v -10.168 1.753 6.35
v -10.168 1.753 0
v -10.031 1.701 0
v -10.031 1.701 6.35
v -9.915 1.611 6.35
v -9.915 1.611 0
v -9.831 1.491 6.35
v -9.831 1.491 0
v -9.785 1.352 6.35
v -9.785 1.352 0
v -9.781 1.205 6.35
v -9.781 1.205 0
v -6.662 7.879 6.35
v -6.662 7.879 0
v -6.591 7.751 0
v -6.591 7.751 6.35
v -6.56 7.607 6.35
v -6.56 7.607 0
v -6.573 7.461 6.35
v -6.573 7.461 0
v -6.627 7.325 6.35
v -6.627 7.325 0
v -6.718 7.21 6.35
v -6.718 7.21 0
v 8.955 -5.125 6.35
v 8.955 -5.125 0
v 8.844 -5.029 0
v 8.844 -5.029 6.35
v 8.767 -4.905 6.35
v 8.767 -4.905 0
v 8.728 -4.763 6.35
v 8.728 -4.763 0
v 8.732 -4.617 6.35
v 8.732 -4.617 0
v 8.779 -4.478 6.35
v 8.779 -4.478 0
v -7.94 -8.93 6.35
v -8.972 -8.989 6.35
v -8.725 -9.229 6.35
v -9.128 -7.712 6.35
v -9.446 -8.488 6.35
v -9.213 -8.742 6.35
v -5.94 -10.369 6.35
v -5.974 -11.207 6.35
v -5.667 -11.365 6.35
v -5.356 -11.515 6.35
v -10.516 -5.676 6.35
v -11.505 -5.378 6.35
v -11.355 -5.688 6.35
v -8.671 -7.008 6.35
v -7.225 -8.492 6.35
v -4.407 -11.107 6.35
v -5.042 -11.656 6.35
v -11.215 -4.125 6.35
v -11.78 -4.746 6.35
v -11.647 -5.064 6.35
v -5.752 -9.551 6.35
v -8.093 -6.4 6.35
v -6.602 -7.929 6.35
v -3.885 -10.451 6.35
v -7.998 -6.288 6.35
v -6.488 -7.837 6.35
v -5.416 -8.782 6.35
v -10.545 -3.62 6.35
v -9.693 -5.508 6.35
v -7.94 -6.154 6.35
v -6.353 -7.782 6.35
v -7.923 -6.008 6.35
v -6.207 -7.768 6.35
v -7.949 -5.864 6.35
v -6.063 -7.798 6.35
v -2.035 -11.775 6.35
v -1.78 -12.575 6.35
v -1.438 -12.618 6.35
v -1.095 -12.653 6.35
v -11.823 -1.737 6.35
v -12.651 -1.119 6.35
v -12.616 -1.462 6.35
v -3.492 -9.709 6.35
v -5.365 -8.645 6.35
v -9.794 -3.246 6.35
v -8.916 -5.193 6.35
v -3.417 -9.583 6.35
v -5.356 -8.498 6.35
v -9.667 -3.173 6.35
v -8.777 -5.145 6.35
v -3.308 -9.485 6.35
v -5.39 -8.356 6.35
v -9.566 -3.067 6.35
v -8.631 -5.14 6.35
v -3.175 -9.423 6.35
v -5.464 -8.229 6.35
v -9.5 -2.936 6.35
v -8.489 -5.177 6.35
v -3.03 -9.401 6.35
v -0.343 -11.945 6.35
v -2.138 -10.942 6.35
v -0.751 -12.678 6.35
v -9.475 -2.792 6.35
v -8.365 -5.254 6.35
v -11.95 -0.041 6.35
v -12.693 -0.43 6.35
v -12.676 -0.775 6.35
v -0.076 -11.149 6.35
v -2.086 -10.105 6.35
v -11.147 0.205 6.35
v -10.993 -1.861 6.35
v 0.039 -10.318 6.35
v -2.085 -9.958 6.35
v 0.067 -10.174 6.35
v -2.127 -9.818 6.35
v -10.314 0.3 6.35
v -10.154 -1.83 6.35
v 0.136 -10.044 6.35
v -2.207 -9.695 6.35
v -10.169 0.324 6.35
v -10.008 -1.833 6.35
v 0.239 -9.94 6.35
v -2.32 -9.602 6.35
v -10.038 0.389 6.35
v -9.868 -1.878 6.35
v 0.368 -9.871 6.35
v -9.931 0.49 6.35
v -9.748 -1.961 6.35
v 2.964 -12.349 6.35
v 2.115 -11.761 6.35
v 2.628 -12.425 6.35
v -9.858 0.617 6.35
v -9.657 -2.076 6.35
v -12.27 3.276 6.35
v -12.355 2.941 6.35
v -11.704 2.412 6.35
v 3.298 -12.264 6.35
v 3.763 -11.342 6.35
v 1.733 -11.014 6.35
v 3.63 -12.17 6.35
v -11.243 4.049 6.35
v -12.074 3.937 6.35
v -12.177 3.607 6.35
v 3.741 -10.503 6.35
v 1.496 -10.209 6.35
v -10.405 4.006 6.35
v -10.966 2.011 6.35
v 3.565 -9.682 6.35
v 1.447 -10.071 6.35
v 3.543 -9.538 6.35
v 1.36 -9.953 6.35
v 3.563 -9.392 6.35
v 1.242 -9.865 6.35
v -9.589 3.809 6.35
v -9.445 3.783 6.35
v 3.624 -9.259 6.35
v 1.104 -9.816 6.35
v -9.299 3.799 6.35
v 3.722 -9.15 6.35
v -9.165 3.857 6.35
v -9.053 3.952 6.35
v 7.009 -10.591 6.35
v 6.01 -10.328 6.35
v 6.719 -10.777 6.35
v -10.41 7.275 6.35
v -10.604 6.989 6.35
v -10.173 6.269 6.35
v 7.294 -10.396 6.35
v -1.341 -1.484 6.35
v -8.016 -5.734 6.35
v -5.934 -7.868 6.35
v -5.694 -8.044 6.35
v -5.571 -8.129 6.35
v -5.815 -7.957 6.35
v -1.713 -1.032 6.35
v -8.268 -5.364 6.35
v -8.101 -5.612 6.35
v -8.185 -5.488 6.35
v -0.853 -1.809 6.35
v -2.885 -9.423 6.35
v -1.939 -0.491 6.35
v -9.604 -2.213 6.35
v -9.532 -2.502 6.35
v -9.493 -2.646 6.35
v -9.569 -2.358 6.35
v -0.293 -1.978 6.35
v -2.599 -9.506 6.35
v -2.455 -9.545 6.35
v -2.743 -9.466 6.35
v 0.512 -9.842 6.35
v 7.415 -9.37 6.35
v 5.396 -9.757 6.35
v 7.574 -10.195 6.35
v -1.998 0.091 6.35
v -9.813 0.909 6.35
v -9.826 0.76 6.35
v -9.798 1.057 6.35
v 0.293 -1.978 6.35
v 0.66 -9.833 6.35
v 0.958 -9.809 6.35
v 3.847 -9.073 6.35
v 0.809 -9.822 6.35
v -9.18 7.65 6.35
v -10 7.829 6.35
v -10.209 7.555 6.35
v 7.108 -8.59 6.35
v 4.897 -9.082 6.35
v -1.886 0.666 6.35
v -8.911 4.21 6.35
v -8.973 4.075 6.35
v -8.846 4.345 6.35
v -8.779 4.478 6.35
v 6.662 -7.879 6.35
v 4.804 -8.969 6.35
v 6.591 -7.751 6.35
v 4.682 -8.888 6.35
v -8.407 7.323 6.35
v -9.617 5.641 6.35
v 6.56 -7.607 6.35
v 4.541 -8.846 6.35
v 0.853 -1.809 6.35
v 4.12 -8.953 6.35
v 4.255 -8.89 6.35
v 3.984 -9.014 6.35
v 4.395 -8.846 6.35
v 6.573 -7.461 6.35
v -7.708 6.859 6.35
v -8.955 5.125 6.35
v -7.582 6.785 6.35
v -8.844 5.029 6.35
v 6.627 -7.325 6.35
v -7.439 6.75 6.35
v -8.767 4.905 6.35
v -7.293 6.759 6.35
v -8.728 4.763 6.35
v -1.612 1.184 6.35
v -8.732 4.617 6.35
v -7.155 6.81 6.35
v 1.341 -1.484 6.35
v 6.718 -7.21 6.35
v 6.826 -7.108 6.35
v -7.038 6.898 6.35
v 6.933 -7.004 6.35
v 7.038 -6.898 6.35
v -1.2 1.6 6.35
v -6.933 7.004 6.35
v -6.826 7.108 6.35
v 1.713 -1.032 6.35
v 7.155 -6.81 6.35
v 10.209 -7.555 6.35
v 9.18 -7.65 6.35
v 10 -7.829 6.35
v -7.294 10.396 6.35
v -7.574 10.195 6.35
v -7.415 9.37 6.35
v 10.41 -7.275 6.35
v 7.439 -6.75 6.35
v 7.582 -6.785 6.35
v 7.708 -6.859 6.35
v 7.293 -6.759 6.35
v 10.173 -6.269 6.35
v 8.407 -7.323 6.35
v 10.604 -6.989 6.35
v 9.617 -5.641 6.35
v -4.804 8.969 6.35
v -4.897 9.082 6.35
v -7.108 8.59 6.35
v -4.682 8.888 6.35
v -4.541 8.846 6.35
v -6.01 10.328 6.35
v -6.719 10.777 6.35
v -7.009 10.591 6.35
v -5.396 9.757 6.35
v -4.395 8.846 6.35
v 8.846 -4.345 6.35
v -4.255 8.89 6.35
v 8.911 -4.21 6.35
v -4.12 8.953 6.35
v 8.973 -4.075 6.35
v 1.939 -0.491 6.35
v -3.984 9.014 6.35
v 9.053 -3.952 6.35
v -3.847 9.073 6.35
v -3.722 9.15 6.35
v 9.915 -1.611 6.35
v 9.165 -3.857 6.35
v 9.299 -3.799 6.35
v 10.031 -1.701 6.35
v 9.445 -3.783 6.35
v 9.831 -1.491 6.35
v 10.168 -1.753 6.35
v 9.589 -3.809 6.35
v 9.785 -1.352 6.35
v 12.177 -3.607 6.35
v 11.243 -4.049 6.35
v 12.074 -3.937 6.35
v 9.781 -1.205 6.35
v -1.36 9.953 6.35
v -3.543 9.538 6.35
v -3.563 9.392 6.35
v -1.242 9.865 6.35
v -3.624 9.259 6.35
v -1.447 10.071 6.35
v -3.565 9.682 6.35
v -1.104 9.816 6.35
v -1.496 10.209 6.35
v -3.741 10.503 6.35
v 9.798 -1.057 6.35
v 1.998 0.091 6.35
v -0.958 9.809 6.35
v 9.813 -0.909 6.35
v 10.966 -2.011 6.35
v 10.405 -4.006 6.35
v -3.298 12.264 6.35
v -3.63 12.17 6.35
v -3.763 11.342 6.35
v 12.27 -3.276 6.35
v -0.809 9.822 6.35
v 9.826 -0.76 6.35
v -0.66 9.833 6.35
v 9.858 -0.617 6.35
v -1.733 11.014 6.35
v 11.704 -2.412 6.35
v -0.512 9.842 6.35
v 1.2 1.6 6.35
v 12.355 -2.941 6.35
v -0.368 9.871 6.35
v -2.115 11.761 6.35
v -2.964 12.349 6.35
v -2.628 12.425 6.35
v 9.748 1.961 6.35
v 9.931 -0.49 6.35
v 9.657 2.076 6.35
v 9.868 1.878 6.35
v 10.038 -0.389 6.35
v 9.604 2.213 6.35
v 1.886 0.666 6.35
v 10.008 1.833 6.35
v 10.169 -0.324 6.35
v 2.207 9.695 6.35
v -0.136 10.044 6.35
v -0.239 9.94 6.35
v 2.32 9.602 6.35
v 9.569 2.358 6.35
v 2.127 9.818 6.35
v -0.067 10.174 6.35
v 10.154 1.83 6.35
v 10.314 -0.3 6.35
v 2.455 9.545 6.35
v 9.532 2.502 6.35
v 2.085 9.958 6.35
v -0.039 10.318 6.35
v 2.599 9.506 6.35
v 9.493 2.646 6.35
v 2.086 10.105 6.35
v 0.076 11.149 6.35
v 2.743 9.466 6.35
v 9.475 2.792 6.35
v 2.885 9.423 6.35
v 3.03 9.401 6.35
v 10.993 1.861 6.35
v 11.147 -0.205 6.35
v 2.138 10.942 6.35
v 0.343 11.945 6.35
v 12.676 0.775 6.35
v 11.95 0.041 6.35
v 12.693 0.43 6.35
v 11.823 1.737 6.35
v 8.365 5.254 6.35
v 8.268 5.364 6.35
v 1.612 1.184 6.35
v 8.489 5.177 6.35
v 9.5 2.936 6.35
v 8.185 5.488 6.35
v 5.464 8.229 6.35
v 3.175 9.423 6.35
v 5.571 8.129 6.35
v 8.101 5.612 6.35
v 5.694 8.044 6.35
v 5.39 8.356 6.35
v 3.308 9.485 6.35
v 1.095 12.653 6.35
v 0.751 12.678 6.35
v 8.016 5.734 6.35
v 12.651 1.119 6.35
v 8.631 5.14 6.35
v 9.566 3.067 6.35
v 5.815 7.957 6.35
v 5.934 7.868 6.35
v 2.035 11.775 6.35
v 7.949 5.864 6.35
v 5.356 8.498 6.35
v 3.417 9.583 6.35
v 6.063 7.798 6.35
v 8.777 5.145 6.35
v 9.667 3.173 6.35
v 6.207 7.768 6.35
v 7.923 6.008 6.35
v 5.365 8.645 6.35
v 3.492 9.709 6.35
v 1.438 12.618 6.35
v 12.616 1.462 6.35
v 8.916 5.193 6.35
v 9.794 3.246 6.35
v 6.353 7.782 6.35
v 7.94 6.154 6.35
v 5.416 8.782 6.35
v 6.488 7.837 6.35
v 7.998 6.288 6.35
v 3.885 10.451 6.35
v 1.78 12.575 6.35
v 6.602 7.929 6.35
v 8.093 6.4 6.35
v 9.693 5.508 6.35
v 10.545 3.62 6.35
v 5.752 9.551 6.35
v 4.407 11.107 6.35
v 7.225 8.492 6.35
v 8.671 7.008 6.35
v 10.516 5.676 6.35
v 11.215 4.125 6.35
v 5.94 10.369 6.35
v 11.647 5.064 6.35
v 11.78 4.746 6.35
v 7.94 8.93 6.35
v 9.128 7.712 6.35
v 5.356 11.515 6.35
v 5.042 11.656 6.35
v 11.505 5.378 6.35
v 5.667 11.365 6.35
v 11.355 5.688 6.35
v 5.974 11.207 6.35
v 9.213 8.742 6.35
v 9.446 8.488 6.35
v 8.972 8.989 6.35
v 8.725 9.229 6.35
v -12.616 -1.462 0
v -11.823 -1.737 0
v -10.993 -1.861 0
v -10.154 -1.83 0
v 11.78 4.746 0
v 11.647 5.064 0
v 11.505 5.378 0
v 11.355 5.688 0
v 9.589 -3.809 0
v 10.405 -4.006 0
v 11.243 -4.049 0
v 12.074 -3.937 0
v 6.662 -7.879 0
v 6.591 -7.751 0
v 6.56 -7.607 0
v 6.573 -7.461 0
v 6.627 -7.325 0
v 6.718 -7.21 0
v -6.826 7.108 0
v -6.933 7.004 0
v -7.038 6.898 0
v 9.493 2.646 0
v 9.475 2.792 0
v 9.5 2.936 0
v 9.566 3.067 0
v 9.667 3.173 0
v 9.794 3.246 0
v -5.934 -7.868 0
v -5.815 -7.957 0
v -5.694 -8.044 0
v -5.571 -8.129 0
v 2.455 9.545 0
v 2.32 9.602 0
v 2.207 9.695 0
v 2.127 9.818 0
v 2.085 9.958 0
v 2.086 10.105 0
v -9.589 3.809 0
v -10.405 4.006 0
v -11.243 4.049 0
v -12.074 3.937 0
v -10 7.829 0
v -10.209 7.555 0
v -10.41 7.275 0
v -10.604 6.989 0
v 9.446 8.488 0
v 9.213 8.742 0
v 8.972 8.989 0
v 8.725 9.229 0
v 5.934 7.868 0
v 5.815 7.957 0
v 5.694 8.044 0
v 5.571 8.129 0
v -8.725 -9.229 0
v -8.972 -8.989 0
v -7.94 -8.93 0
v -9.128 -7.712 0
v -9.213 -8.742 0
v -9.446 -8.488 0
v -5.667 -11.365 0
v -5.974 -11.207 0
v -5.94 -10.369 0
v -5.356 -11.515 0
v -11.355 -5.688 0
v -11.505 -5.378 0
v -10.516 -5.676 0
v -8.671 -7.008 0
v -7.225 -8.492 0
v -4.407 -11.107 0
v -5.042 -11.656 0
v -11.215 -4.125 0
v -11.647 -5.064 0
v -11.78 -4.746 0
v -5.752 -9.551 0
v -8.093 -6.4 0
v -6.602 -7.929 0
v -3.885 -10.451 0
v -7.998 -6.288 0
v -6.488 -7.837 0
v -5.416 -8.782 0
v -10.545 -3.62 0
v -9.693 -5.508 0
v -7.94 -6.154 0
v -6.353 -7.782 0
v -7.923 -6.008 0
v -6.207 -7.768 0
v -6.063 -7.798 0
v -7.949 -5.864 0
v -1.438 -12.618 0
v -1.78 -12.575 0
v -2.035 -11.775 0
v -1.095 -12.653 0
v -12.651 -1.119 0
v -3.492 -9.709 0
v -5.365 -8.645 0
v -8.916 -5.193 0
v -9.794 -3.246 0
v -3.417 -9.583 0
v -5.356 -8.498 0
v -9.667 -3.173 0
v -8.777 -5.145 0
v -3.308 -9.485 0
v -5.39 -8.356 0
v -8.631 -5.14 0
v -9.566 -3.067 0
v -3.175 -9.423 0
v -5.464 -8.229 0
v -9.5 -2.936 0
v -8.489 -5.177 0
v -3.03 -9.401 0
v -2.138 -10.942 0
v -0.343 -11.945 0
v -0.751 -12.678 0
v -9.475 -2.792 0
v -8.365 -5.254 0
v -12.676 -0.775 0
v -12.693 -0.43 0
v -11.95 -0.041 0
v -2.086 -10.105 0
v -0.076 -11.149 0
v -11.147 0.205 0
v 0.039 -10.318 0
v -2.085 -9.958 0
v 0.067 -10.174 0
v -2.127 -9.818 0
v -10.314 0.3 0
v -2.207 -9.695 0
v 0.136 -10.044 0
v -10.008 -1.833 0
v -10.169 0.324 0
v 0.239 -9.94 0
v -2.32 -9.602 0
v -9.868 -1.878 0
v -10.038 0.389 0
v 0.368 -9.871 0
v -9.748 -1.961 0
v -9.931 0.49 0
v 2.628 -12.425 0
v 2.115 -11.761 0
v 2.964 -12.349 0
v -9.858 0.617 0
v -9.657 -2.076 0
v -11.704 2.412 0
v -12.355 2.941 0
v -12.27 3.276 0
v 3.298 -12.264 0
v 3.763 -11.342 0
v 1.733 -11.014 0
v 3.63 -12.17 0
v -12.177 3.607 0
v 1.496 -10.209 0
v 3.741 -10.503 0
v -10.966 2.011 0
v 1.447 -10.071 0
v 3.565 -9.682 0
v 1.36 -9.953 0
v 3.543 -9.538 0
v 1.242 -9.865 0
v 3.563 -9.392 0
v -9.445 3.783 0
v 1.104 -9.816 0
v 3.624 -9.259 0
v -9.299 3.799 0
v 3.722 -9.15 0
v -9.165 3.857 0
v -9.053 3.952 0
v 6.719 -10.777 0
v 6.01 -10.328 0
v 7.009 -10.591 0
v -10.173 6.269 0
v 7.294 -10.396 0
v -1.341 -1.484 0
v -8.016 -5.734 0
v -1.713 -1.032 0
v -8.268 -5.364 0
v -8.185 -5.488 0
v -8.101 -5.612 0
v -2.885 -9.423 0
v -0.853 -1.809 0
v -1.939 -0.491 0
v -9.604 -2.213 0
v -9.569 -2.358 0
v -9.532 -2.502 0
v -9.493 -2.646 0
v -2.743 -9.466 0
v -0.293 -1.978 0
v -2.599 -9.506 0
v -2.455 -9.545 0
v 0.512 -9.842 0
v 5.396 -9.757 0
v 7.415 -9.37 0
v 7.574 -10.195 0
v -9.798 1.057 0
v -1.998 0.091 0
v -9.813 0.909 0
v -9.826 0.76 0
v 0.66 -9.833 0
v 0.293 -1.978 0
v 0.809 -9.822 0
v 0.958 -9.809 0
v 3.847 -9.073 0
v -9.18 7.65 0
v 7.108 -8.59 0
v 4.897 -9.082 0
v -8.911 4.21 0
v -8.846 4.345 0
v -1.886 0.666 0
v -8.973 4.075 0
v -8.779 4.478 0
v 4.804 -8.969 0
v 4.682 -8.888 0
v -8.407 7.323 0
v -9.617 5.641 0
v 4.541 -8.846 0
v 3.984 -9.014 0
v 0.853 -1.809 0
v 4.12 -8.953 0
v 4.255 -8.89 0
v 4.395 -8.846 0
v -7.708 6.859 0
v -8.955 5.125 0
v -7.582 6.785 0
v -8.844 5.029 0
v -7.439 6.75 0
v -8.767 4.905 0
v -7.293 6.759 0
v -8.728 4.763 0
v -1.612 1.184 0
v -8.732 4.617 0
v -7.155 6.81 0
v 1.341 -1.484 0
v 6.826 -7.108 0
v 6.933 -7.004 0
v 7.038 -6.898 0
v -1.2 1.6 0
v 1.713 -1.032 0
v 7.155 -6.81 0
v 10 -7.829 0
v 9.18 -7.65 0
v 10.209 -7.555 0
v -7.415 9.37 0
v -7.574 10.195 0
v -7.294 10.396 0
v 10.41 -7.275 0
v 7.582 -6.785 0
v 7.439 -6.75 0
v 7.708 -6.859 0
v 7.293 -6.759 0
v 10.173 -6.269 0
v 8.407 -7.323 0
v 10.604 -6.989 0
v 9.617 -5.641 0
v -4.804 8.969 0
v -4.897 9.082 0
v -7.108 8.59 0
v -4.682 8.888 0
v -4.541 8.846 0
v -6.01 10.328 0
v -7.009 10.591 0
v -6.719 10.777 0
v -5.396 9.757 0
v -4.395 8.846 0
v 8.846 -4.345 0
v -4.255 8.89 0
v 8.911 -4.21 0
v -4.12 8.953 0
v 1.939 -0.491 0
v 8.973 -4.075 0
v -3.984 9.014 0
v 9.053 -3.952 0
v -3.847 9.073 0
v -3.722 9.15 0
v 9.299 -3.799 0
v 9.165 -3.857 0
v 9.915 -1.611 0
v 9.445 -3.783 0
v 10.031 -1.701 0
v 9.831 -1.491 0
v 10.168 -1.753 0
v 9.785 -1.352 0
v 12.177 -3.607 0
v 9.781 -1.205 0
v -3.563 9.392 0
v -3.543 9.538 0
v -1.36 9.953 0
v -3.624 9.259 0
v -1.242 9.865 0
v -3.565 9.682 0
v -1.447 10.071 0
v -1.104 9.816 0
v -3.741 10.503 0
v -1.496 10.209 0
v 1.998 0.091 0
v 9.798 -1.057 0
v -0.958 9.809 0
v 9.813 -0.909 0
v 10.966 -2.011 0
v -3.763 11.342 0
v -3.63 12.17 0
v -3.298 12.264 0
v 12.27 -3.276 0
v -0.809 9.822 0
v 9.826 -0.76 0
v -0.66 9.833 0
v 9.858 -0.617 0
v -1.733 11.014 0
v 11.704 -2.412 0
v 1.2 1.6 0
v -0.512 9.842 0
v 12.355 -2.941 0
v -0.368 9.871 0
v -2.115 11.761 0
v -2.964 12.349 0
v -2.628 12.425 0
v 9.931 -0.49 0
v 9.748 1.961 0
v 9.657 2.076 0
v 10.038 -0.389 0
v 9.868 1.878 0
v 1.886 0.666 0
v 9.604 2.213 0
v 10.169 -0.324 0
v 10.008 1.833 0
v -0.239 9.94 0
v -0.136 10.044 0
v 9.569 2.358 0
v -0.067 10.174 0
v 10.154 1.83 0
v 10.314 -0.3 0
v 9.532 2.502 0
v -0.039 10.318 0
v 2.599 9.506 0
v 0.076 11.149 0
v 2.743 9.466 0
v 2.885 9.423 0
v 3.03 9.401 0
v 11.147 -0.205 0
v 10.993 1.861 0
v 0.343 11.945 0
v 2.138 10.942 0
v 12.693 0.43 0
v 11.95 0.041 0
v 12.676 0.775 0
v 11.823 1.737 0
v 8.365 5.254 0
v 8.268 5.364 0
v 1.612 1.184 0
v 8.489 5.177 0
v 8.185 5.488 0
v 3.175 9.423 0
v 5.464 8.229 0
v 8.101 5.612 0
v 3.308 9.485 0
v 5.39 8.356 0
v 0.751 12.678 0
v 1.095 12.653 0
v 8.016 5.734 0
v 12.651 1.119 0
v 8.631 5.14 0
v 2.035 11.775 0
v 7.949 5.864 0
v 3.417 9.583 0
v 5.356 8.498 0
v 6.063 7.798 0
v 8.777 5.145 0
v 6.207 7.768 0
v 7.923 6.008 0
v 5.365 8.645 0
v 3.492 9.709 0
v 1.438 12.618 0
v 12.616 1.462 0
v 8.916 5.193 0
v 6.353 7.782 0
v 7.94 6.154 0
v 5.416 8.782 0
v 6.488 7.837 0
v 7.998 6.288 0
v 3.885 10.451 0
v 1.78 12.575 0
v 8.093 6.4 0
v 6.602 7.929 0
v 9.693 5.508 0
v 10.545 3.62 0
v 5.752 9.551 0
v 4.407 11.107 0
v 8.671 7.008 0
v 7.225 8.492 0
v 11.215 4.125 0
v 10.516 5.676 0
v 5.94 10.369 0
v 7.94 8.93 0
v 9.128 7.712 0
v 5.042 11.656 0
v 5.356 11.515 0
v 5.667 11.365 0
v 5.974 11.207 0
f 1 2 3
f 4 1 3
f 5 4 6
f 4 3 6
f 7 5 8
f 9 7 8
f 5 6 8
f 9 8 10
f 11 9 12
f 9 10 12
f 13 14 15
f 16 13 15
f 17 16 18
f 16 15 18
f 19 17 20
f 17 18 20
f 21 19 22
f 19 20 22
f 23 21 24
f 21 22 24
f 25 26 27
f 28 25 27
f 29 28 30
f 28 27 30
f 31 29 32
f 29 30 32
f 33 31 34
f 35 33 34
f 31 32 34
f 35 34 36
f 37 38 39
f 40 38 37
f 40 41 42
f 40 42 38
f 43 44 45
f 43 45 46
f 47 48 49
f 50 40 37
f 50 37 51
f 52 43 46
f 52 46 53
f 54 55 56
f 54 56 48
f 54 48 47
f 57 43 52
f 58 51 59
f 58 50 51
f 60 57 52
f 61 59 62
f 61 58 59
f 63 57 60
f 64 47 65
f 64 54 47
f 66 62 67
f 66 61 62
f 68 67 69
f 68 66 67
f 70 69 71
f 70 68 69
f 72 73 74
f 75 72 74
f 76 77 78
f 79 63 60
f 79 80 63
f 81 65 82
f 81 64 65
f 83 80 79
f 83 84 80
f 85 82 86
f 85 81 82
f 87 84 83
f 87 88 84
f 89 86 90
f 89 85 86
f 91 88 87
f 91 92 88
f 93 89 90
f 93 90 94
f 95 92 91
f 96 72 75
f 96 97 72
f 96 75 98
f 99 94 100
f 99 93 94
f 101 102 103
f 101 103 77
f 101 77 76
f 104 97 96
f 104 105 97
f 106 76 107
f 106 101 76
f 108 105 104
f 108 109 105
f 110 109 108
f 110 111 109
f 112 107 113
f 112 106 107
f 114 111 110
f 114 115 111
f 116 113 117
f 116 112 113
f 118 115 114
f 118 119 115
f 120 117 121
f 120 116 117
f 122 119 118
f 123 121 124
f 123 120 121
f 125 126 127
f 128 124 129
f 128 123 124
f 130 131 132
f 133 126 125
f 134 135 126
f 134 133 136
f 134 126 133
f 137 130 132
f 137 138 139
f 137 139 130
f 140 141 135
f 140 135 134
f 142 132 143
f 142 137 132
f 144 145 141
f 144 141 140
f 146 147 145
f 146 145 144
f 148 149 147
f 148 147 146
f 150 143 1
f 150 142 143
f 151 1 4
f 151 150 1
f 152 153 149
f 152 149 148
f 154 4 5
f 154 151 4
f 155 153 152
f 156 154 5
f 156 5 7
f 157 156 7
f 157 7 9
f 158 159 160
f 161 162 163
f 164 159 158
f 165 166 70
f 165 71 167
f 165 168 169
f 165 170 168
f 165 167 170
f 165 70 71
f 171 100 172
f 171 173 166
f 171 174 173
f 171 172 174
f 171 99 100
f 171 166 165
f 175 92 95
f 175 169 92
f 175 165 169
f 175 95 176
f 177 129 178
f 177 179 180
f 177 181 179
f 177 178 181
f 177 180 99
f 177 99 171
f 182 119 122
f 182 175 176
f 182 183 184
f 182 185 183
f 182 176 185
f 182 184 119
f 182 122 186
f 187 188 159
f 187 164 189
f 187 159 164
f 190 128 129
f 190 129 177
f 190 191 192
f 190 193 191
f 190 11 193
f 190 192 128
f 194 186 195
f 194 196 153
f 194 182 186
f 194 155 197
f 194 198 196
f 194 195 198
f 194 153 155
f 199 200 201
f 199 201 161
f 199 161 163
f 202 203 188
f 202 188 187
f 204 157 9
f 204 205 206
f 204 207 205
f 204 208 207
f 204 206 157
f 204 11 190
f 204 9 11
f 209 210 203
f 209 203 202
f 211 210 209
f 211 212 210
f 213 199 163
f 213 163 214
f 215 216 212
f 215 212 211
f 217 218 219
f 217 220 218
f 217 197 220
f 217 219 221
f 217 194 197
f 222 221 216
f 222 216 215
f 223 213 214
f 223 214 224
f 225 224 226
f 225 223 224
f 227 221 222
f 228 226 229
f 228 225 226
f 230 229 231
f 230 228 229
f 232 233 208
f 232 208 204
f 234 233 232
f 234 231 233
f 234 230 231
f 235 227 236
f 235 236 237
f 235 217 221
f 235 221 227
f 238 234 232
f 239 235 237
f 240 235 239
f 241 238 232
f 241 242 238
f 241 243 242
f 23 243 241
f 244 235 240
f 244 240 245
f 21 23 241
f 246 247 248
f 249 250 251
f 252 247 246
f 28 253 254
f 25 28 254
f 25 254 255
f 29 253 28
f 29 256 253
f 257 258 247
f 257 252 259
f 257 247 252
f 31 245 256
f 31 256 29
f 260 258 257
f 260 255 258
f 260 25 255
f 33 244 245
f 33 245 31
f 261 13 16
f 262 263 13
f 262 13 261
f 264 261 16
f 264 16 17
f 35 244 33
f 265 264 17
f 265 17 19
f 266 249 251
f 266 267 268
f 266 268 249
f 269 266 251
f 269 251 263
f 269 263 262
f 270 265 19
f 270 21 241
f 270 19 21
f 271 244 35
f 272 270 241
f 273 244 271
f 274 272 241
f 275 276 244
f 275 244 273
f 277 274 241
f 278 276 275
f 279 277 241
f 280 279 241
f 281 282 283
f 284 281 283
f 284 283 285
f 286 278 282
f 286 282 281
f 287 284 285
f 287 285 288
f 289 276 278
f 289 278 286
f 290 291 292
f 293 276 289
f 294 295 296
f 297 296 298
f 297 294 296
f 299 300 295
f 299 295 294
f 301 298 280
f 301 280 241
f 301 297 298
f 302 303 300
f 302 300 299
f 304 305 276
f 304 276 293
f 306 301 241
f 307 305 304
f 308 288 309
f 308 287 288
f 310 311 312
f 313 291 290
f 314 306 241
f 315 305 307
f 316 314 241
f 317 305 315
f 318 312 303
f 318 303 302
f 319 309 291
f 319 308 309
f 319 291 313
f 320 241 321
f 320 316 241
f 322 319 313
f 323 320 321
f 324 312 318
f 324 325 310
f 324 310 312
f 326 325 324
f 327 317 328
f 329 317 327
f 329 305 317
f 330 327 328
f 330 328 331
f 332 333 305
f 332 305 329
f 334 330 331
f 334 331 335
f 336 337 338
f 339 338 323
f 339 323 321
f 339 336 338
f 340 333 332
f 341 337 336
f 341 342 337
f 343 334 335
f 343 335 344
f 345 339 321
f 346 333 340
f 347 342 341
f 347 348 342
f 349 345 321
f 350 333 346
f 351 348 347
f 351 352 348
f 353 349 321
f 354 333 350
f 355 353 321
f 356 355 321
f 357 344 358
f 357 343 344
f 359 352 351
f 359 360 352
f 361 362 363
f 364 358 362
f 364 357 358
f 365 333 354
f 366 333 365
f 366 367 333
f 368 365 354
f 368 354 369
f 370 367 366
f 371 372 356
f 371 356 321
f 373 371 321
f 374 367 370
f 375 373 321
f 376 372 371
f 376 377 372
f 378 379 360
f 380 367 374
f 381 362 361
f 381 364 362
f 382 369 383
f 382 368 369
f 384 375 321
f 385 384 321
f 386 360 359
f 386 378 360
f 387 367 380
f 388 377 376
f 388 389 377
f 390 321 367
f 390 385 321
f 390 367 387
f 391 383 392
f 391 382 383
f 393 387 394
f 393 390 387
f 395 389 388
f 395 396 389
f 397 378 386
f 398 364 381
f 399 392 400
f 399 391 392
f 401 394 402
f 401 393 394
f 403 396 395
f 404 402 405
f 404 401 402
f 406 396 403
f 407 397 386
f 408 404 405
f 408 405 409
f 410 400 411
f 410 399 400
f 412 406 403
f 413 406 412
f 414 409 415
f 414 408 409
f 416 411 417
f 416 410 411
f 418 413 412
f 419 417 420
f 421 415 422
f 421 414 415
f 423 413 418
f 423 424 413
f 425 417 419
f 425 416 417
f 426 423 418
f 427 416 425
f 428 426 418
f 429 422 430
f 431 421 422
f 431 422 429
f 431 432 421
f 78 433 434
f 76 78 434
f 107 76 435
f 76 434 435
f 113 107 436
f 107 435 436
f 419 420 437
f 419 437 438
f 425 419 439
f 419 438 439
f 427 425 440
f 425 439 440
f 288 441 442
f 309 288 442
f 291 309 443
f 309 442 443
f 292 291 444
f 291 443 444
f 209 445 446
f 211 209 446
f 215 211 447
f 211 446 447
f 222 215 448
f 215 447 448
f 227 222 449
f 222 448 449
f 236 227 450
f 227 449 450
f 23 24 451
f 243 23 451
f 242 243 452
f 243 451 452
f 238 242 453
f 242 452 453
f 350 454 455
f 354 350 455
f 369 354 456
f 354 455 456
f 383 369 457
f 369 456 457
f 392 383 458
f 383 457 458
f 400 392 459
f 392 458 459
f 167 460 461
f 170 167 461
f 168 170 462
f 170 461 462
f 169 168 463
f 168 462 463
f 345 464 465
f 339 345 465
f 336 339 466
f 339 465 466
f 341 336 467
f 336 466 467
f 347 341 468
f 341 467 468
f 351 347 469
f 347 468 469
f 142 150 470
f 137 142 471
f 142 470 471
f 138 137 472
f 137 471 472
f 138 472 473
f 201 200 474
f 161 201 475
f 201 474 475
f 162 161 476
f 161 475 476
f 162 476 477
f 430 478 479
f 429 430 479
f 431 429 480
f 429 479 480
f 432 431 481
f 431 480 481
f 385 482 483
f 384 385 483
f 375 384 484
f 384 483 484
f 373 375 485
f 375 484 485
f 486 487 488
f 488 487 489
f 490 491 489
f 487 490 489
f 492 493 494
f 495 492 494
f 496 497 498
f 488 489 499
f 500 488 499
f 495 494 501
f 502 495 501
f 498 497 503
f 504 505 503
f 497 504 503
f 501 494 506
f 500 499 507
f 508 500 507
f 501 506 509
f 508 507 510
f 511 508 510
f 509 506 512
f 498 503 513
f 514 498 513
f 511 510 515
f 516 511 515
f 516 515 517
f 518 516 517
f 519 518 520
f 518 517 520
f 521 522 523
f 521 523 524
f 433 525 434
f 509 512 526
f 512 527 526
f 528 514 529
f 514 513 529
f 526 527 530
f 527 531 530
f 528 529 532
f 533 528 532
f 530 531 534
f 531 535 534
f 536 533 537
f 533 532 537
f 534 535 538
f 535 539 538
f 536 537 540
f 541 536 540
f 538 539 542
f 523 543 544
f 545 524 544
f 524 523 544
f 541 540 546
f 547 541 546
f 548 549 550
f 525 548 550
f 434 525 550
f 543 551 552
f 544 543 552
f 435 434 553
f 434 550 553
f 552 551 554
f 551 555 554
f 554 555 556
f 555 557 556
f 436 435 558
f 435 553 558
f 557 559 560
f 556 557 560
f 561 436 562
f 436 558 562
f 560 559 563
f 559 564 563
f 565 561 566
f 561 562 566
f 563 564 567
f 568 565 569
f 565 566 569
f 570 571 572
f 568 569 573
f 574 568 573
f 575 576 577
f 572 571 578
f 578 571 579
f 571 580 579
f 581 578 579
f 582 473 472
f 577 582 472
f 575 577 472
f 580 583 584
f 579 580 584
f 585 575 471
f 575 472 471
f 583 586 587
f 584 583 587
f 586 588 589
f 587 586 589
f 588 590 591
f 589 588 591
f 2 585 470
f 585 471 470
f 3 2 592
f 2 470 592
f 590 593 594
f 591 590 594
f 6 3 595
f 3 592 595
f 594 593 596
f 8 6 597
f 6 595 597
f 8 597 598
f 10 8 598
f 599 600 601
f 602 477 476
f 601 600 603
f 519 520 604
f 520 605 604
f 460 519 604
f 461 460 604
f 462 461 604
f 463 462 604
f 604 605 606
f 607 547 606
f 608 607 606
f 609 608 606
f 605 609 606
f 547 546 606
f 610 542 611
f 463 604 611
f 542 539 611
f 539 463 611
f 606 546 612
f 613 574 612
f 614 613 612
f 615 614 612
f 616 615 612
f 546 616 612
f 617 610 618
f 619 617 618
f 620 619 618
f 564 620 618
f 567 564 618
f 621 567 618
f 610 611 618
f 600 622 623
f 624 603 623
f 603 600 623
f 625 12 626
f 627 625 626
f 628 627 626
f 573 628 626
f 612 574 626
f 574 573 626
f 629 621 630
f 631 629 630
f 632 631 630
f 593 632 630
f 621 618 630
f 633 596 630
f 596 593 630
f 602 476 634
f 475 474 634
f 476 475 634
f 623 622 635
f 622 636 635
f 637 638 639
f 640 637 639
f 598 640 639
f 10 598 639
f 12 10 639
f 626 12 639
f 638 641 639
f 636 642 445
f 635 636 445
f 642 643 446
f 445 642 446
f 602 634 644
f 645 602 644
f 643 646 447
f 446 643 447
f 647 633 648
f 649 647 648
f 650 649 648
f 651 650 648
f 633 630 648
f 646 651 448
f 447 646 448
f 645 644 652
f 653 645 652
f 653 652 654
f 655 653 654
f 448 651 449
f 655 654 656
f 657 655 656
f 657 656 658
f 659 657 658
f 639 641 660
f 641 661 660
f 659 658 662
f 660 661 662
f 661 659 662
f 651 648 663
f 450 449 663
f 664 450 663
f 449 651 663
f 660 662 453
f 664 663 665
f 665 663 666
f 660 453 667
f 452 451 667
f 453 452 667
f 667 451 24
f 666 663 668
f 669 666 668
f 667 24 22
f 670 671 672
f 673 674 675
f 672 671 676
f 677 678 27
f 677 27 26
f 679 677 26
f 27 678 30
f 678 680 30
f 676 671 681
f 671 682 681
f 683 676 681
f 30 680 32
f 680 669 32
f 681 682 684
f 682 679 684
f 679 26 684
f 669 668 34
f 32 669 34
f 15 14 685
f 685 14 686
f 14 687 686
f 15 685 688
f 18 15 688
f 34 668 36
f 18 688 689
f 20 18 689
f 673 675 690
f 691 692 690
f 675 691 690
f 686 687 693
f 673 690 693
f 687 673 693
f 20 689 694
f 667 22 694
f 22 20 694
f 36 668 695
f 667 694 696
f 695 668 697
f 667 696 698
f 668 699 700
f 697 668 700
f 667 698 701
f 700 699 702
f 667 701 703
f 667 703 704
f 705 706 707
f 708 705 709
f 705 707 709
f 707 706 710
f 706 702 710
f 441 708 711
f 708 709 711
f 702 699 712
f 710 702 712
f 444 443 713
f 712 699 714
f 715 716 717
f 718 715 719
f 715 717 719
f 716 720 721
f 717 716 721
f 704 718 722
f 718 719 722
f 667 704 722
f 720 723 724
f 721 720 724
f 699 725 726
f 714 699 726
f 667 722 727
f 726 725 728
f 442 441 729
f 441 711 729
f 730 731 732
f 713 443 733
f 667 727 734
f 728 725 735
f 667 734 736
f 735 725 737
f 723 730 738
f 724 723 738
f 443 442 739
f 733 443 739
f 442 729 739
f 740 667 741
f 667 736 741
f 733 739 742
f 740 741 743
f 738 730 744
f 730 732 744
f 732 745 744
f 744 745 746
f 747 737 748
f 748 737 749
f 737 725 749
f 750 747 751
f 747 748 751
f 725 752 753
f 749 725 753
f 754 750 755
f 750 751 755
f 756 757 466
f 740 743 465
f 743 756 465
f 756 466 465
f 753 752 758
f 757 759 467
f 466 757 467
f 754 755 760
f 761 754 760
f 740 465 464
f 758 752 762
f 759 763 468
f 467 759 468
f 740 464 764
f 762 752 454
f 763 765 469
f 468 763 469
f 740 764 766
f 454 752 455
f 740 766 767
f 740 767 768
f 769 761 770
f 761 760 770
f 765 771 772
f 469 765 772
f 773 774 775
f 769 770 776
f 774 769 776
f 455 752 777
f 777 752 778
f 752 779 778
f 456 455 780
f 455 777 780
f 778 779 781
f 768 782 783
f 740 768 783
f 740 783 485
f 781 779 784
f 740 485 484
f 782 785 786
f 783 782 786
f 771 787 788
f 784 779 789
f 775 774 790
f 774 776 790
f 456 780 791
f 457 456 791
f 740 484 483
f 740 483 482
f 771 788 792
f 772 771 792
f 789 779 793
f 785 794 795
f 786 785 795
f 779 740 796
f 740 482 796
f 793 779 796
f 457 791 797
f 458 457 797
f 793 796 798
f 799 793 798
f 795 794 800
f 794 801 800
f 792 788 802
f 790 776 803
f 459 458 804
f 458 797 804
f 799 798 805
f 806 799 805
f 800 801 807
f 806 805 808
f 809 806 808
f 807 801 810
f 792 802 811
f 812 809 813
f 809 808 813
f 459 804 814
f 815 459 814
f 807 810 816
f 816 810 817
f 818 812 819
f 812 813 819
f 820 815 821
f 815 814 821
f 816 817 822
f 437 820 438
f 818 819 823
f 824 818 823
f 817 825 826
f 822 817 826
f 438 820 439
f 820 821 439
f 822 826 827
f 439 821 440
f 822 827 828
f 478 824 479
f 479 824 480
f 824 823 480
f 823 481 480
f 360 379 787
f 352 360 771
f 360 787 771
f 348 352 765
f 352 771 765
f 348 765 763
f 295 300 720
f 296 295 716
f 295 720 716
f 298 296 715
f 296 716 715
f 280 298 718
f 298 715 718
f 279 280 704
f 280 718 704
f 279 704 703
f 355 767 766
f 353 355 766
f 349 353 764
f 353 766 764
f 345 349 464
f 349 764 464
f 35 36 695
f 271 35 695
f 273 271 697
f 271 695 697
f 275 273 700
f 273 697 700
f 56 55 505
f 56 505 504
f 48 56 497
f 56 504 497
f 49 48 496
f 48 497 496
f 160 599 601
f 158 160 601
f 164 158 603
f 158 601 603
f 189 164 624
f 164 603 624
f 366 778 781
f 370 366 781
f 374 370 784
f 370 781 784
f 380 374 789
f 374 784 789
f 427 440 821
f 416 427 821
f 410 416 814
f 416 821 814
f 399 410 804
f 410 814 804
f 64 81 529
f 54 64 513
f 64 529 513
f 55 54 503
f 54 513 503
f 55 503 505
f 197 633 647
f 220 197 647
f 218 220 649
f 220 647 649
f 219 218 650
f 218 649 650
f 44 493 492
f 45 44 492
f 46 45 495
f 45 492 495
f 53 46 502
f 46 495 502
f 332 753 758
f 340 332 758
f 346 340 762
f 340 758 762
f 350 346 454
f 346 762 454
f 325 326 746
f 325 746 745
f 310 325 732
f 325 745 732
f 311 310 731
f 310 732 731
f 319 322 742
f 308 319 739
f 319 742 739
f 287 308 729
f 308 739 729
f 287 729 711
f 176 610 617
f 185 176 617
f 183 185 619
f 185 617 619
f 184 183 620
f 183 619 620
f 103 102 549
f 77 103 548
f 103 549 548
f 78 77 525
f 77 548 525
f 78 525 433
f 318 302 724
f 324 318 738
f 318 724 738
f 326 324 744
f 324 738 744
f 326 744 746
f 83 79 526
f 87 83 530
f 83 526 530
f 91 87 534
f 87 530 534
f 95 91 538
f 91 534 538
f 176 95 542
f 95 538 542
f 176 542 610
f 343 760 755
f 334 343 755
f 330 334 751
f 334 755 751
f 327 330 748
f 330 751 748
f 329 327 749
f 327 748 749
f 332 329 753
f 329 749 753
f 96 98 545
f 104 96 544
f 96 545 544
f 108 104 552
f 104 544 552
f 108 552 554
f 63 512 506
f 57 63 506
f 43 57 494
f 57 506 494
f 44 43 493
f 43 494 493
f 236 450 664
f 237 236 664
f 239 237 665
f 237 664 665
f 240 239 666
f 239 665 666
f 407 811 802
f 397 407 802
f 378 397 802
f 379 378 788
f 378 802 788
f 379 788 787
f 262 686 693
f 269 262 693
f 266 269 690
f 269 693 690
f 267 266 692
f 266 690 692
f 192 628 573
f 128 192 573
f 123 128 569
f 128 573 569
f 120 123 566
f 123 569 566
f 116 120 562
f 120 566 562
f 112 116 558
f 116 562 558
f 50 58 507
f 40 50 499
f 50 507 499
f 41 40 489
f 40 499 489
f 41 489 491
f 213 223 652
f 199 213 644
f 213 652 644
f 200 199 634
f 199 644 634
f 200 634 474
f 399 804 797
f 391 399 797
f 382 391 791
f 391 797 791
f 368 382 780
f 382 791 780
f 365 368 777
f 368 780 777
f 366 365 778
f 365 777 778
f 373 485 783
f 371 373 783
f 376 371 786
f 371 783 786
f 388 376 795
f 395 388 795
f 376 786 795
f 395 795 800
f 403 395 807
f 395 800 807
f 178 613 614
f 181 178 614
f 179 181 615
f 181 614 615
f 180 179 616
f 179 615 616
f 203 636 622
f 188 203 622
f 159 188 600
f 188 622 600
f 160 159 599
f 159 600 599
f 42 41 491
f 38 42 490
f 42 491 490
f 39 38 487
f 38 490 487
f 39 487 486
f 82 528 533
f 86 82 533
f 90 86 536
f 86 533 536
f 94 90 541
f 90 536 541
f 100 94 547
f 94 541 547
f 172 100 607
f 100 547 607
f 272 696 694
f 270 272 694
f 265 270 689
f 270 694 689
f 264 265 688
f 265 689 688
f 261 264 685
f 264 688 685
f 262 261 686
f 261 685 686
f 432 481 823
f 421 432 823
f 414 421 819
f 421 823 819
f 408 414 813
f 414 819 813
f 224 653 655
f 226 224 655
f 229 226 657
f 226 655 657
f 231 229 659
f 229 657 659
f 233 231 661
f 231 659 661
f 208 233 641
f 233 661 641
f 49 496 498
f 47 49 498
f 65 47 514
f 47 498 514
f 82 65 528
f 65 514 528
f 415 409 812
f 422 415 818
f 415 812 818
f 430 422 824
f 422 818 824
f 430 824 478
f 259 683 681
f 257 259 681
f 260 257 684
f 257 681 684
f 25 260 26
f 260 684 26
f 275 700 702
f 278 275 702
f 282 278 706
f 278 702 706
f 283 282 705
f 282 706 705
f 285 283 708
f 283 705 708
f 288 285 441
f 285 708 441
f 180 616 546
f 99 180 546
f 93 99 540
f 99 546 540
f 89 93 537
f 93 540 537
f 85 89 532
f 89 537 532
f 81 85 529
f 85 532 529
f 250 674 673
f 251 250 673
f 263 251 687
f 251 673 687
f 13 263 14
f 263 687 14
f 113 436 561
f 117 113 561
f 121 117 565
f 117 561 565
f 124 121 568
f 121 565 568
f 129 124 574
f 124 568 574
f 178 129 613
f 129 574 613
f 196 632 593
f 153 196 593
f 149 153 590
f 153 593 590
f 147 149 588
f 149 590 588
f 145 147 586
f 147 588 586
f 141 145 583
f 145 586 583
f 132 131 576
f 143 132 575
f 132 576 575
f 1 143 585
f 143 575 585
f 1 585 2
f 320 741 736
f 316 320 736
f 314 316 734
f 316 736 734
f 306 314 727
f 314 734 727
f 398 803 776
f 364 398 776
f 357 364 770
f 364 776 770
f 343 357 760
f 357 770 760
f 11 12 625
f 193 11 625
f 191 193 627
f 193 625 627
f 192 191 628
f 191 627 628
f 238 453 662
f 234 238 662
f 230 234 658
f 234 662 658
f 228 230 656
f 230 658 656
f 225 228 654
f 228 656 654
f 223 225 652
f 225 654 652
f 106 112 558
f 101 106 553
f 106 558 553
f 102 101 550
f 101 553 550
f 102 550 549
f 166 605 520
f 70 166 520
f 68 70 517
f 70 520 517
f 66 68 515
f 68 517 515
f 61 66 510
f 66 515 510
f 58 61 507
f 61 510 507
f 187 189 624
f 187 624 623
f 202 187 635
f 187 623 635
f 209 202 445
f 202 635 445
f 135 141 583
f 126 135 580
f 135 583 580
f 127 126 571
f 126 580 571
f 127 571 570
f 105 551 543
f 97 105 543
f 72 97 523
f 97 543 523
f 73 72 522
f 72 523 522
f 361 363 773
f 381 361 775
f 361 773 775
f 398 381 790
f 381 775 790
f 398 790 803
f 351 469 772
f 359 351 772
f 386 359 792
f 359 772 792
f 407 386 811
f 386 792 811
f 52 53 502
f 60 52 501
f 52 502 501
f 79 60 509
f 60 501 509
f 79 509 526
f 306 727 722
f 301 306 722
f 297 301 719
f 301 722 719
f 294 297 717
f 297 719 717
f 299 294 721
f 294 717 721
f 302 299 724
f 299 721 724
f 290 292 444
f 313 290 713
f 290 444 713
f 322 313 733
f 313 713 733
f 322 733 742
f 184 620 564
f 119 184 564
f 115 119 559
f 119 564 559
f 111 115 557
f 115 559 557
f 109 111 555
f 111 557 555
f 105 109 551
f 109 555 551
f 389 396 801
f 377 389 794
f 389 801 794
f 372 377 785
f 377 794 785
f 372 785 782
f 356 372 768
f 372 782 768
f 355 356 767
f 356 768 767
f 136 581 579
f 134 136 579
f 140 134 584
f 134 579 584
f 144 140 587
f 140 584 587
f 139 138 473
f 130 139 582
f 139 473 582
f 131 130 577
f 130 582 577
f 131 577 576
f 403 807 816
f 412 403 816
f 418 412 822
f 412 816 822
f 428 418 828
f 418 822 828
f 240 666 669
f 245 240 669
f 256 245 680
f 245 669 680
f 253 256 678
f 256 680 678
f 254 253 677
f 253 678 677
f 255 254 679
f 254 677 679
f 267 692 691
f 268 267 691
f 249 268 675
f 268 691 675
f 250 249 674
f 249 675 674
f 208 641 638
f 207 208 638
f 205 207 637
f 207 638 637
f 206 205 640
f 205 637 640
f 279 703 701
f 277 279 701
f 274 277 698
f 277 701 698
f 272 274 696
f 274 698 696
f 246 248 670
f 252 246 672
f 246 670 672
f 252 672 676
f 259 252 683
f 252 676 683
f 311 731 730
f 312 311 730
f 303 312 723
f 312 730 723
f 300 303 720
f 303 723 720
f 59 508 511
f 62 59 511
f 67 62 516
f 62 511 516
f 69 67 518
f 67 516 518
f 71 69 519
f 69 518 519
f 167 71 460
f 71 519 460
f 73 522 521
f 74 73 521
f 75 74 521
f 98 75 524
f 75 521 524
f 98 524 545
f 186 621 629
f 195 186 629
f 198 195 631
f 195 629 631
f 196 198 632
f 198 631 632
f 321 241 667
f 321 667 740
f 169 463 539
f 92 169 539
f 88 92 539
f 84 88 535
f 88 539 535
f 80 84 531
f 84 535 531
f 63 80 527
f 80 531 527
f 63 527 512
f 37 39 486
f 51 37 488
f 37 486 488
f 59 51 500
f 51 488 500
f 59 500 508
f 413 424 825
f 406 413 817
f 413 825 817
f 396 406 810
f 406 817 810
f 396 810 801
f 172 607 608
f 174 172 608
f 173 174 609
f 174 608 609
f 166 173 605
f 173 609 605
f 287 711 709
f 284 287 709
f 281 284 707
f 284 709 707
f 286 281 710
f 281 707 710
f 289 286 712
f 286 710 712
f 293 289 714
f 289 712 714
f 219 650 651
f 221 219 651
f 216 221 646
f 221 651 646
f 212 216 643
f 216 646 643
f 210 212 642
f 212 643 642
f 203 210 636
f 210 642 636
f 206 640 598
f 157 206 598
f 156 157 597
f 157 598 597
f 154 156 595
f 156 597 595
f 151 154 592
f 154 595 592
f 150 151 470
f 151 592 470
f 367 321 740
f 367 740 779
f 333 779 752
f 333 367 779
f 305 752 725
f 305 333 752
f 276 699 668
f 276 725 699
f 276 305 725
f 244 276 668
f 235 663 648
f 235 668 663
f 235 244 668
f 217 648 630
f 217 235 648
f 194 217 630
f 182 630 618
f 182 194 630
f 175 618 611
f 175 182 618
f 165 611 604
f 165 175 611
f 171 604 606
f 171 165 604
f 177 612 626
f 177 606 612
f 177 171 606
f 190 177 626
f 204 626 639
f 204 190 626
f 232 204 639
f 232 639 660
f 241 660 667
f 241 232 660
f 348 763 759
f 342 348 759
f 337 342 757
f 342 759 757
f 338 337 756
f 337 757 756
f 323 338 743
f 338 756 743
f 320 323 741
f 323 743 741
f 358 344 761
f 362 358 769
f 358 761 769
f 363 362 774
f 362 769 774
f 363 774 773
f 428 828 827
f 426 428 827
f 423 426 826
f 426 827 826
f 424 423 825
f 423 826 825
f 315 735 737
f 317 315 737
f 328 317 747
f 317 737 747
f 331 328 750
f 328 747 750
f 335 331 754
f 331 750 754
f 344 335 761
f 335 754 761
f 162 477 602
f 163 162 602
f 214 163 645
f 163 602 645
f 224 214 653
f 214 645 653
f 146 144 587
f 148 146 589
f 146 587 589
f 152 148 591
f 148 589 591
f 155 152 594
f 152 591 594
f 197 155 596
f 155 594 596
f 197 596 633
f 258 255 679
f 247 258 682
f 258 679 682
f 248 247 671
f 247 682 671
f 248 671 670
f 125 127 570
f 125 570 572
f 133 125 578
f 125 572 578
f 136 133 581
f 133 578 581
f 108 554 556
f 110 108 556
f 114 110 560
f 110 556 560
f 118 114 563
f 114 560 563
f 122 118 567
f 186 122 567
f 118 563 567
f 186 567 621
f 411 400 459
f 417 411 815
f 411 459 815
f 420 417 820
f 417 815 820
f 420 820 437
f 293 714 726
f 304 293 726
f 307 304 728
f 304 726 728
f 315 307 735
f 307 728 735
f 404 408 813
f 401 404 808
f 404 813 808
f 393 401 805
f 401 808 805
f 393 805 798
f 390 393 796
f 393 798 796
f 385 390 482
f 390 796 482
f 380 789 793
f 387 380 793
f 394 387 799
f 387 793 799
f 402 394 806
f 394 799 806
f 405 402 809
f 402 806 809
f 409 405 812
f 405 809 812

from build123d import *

# Parameters (mm, degrees)
SKETCH3_R         = 12.7
GEARBODY_DEPTH    = 6.35
TOOTHCUT_DEPTH    = 7.35
CIRPATTERN1_COUNT = 18
BORE_DEPTH        = 12.7


with BuildPart() as part:
    # Sketch3 → gearBody (new body)
    with BuildSketch(Plane.XY):
        Circle(SKETCH3_R)
    extrude(amount=GEARBODY_DEPTH)

    # Sketch2 → toothCut (cut, through all)
    with BuildSketch(Plane.XY):
        with BuildLine():
            ThreePointArc((9.781229257, -1.205205904), (9.806057787, -0.982953571), (9.825836884, -0.760195085))
            ThreePointArc((9.825836884, -0.760195085), (9.980803767, -0.435792976), (10.31355819, -0.299682883))
            ThreePointArc((10.31355819, -0.299682883), (12.38209996, 0.246018063), (13.970369973, 1.679214819))
            ThreePointArc((13.970369973, 1.679214819), (14.000763839, -1.403428484), (13.359117821, -4.418706897))
            ThreePointArc((13.359117821, -4.418706897), (12.0869153, -2.698778026), (10.167842346, -1.753360882))
            ThreePointArc((10.167842346, -1.753360882), (9.868724138, -1.553912241), (9.781229257, -1.205205904))
        make_face()
    toothcut = extrude(amount=TOOTHCUT_DEPTH, mode=Mode.SUBTRACT)

    # CirPattern1: toothCut ×18 about axis
    cirpattern1_axis = Axis((0, 0, 0), (0, 0, 1))
    for i in range(1, CIRPATTERN1_COUNT):
        add(toothcut.rotate(cirpattern1_axis, i * 360 / CIRPATTERN1_COUNT), mode=Mode.SUBTRACT)

    # boreDia → bore (cut, symmetric)
    with BuildSketch(Plane.XY):
        with BuildLine():
            Line((-1.2, 1.60000008), (1.2, 1.60000008))
            ThreePointArc((1.2, 1.60000008), (0, -2.000000064), (-1.2, 1.60000008))
        make_face()
    extrude(amount=BORE_DEPTH, both=True, mode=Mode.SUBTRACT)


solid = part.part
